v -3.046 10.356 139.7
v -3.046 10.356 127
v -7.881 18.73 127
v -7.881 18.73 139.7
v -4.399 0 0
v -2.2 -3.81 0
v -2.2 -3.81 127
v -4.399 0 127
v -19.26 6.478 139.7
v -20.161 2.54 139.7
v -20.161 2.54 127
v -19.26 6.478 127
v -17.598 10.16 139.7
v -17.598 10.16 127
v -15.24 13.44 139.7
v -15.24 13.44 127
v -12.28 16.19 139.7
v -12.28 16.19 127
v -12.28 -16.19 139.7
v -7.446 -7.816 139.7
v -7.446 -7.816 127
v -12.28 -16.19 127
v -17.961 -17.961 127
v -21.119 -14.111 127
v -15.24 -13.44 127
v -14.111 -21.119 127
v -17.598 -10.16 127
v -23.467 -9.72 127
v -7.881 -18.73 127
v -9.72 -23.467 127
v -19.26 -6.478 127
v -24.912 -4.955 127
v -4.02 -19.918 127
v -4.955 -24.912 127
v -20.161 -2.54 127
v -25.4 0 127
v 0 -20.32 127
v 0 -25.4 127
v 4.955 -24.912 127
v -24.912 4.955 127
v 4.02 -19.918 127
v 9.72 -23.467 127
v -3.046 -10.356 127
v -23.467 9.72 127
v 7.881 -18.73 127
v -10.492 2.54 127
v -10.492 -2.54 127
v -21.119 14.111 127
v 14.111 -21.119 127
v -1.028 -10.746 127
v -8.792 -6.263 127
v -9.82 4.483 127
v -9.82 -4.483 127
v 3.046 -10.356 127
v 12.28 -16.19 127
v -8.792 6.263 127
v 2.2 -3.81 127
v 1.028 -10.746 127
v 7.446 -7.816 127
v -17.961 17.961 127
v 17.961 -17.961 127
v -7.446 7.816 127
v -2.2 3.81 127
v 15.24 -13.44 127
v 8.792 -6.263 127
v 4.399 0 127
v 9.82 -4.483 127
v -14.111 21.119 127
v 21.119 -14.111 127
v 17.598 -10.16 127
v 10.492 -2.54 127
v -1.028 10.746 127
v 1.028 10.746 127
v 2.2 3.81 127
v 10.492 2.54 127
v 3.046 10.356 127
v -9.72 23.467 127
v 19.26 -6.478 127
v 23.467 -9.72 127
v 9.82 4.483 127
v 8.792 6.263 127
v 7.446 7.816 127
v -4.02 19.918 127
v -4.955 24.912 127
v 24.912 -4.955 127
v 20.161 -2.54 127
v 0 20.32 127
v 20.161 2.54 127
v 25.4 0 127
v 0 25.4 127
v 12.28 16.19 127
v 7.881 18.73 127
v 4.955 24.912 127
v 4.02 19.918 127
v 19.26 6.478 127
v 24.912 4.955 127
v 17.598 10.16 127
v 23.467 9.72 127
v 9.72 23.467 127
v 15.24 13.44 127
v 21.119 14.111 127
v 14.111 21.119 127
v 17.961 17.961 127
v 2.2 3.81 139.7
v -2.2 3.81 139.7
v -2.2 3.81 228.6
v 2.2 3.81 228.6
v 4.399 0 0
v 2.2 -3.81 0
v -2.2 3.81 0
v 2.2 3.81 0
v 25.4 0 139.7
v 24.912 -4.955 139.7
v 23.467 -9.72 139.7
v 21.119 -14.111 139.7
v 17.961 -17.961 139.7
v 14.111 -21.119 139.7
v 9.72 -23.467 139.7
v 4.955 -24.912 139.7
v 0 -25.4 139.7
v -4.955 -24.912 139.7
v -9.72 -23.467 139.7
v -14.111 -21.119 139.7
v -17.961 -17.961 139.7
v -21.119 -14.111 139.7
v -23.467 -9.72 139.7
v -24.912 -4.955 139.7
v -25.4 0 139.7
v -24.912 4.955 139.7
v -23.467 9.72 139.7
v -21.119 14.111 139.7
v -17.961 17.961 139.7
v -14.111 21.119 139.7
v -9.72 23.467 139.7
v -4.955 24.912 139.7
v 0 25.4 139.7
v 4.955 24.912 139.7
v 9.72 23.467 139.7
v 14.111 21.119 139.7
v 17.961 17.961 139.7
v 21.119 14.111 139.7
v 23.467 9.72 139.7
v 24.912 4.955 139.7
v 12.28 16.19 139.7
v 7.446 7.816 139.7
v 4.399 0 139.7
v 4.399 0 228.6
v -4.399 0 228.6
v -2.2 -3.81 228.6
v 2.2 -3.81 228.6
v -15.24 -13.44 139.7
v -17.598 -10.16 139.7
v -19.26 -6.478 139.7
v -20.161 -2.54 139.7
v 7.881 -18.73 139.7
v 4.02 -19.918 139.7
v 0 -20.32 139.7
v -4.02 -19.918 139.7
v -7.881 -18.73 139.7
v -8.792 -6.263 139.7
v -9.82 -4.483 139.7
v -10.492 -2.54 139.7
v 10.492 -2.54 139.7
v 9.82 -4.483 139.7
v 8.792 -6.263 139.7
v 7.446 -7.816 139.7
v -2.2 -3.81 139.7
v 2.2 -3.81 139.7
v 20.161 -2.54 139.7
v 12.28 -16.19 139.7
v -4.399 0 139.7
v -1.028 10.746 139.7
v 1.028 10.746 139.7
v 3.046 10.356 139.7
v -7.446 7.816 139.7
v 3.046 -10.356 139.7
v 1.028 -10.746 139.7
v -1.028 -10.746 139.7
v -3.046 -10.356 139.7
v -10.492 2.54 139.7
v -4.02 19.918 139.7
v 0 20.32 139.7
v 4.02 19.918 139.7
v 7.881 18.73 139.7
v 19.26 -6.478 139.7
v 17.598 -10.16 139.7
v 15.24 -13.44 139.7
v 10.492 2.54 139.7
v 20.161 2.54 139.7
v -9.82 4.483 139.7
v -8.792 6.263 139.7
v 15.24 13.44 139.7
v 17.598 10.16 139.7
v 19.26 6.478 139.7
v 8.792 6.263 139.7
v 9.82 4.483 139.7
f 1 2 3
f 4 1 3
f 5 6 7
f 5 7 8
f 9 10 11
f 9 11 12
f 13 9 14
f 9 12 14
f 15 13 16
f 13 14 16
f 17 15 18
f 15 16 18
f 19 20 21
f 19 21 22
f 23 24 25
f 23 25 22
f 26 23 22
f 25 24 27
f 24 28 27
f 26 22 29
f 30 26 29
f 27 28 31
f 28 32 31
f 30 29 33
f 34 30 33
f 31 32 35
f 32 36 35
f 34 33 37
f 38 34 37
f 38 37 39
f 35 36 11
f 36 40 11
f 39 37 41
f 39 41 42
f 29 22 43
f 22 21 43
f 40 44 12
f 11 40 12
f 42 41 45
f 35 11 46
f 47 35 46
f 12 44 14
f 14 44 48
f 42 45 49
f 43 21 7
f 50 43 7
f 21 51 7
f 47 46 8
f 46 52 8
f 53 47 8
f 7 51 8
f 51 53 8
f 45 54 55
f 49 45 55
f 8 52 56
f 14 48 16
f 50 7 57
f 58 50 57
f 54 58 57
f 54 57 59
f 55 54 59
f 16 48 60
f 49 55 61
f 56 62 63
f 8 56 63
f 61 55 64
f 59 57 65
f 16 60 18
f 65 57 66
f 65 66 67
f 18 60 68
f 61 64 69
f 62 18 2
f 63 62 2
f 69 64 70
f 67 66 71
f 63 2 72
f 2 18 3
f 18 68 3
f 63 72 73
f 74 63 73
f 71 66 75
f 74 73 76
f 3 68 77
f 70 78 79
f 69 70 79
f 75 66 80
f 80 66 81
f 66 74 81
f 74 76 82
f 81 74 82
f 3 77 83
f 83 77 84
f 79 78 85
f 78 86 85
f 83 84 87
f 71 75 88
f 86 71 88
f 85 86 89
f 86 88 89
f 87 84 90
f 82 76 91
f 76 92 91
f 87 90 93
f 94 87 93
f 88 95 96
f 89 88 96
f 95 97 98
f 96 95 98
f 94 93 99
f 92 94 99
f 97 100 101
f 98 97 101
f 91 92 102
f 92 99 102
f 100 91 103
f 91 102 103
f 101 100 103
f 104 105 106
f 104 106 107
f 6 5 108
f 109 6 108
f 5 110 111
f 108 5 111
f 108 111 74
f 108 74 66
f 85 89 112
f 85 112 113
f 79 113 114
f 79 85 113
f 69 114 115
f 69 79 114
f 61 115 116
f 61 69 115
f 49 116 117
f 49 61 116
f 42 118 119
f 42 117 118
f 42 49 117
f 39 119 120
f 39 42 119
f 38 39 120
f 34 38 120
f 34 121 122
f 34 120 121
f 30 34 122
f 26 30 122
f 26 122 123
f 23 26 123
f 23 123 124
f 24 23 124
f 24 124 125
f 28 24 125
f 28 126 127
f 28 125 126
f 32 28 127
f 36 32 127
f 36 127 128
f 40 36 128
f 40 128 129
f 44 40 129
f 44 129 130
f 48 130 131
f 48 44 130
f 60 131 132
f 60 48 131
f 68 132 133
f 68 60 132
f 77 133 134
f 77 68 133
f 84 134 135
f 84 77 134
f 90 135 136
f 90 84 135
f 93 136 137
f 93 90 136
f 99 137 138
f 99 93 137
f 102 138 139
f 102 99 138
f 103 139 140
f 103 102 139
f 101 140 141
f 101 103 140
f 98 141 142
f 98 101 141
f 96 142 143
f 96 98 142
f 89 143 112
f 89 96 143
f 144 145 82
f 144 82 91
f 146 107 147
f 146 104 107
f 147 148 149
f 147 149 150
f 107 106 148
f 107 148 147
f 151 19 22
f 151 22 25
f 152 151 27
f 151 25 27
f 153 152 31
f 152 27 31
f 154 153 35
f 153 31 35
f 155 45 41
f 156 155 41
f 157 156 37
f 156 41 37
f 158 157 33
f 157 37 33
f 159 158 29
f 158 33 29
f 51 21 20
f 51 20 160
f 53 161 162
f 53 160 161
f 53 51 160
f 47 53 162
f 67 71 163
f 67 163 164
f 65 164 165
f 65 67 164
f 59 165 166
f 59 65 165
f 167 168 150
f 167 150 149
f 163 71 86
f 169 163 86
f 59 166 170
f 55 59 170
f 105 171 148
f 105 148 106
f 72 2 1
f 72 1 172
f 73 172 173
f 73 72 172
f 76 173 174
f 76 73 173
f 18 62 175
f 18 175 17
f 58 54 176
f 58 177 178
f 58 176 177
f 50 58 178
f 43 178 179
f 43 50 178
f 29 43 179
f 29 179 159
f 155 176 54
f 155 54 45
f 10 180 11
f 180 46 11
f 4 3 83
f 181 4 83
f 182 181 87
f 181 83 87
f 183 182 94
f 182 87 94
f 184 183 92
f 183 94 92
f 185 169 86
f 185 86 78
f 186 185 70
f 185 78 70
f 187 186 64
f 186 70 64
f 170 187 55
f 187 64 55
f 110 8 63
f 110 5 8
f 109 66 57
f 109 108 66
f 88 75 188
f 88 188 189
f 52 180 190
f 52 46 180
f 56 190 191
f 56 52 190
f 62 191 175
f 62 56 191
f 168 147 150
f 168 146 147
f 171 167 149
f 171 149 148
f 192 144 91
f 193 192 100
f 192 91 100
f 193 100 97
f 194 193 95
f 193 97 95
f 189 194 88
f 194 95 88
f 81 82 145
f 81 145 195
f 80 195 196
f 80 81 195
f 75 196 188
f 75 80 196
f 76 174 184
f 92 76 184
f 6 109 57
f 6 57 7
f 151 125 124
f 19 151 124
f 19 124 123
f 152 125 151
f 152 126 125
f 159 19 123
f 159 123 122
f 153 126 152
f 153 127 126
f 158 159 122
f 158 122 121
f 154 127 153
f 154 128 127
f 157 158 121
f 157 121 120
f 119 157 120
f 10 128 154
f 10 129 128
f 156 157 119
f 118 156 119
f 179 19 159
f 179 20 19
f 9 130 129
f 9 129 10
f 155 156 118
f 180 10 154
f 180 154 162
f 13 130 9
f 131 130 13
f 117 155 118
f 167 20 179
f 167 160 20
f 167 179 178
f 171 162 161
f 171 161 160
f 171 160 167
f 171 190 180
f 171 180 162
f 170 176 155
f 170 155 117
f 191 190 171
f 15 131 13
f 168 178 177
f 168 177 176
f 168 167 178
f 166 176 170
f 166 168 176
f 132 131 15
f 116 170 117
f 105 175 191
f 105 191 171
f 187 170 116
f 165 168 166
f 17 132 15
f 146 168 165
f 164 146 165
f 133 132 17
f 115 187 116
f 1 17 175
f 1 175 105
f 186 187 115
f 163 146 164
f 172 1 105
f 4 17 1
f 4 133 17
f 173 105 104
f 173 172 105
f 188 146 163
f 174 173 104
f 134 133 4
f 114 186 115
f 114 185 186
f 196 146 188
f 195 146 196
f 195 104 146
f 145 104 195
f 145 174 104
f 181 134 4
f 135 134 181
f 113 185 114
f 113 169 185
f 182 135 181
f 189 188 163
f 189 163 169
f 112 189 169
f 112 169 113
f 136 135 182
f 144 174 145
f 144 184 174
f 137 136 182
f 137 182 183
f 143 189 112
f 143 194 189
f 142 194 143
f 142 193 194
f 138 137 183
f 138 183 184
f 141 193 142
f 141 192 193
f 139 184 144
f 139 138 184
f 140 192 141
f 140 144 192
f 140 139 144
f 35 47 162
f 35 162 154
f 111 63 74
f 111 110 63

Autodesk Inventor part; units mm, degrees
ref_plane "YZ Plane" through (0, 0, 0) normal (1, 0, 0) x (0, 1, 0)
ref_plane "XZ Plane" through (0, 0, 0) normal (0, 1, 0) x (-1, 0, 0)
sketch "Sketch1" plane through (0, 0, 0) normal (0, 0, 1) x (1, 0, 0)
  line L0 (2.1997, 3.81) -> (4.3994, 0)
  line L1 (4.3994, 0) -> (2.1997, -3.81)
  line L2 (2.1997, -3.81) -> (-2.1997, -3.81)
  line L3 (-2.1997, -3.81) -> (-4.3994, 0)
  line L4 (-4.3994, 0) -> (-2.1997, 3.81)
  line L5 (-2.1997, 3.81) -> (2.1997, 3.81)
  line L6 (0, 0) -> (1.0543, 0)
  dimension "d0" = 7.62
extrude "Extrusion1" add sketch "Sketch1" along normal blind 228.6
ref_plane "Work Plane1" through (0, 0, 127) normal (0, 0, 1) x (1, 0, 0)
sketch "Sketch2" plane through (0, 0, 127) normal (0, 0, 1) x (1, 0, 0)
  line L0 (2.1997, 3.81) -> (4.3994, 0) construction
  line L1 (4.3994, 0) -> (2.1997, -3.81) projected
  line L2 (2.1997, -3.81) -> (-2.1997, -3.81) projected
  line L3 (-2.1997, -3.81) -> (-4.3994, 0) projected
  line L4 (-4.3994, 0) -> (-2.1997, 3.81) projected
  line L5 (-2.1997, 3.81) -> (2.1997, 3.81) projected
  circle A0 centre (0, 0) radius 25.4
  circle A1 centre (0, 0) radius 20.32
  circle A2 centre (0, 0) radius 10.795
  line L6 (-2.1997, 3.81) -> (-4.3994, 0) projected
  line L7 (-4.3994, 0) -> (-2.1997, -3.81) projected
  line L8 (2.1997, -3.81) -> (4.3994, 0) projected
  line L9 (2.1997, 3.81) -> (-2.1997, 3.81) projected
  line L10 (4.3994, 0) -> (2.1997, 3.81) projected
  line L11 (-4.3994, 0) -> (-20.32, 0)
  line L12 (4.3994, 0) -> (20.32, 0)
  line L13 (10.4919, -2.54) -> (20.1606, -2.54)
  line L14 (10.4919, 2.54) -> (20.1606, 2.54)
  line L15 (-10.4919, 2.54) -> (-20.1606, 2.54)
  line L16 (-10.4919, -2.54) -> (-20.1606, -2.54)
  line L17 (-2.1997, 3.81) -> (-10.16, 17.5976)
  line L18 (2.1997, 3.81) -> (10.16, 17.5976)
  line L19 (-2.1997, -3.81) -> (2.1997, -3.81) projected
  line L20 (2.1997, -3.81) -> (10.16, -17.5976)
  line L21 (-2.1997, -3.81) -> (-10.16, -17.5976)
  line L22 (-7.4457, 7.8163) -> (-12.28, 16.1896)
  line L23 (-3.0463, 10.3563) -> (-7.8806, 18.7296)
  line L24 (3.0463, 10.3563) -> (7.8806, 18.7296)
  line L25 (7.4457, 7.8163) -> (12.28, 16.1896)
  line L26 (7.4457, -7.8163) -> (12.28, -16.1896)
  line L27 (3.0463, -10.3563) -> (7.8806, -18.7296)
  line L28 (-7.4457, -7.8163) -> (-12.28, -16.1896)
  line L29 (-3.0463, -10.3563) -> (-7.8806, -18.7296)
  dimension "d6" = 21.59
  dimension "d4" = 50.8
  dimension "d5" = 5.08
  dimension "d31" = 5.08
  dimension "d32" = 2.54
  dimension "d33" = 5.08
  dimension "d34" = 2.54
  dimension "d35" = 120
  dimension "d36" = 120
  dimension "d37" = 120
  dimension "d38" = 120
  dimension "d39" = 5.08
  dimension "d40" = 2.54
  dimension "d41" = 5.08
  dimension "d42" = 2.54
  dimension "d44" = 5.08
  dimension "d45" = 2.54
  dimension "d46" = 5.08
  dimension "d47" = 2.54
extrude "Extrusion3" add sketch "Sketch2" along normal blind 12.7 contours L12 A2 L20 L1 | L10 L18 A2 L12 | L20 A2 L21 L2 | L5 L17 A2 L18 | L12 A1 L13 A2 | A2 L14 A1 L12 | L21 A2 L11 L3 | L20 A1 L27 A2 | A2 L26 A1 L20 | L4 L11 A2 L17 | L18 A1 L25 A2 | A2 L24 A1 L18 | L21 A1 L28 A2 | A2 L29 A1 L21 | L17 A1 L23 A2 | A2 L22 A1 L17 | L11 A1 L15 A2 | A2 L16 A1 L11 | A0
equation "\"d36\" = d35"
equation "\"d37\" = d35"
equation "\"d38\" = d35"
properties part number "RobotArm HexWheel"
